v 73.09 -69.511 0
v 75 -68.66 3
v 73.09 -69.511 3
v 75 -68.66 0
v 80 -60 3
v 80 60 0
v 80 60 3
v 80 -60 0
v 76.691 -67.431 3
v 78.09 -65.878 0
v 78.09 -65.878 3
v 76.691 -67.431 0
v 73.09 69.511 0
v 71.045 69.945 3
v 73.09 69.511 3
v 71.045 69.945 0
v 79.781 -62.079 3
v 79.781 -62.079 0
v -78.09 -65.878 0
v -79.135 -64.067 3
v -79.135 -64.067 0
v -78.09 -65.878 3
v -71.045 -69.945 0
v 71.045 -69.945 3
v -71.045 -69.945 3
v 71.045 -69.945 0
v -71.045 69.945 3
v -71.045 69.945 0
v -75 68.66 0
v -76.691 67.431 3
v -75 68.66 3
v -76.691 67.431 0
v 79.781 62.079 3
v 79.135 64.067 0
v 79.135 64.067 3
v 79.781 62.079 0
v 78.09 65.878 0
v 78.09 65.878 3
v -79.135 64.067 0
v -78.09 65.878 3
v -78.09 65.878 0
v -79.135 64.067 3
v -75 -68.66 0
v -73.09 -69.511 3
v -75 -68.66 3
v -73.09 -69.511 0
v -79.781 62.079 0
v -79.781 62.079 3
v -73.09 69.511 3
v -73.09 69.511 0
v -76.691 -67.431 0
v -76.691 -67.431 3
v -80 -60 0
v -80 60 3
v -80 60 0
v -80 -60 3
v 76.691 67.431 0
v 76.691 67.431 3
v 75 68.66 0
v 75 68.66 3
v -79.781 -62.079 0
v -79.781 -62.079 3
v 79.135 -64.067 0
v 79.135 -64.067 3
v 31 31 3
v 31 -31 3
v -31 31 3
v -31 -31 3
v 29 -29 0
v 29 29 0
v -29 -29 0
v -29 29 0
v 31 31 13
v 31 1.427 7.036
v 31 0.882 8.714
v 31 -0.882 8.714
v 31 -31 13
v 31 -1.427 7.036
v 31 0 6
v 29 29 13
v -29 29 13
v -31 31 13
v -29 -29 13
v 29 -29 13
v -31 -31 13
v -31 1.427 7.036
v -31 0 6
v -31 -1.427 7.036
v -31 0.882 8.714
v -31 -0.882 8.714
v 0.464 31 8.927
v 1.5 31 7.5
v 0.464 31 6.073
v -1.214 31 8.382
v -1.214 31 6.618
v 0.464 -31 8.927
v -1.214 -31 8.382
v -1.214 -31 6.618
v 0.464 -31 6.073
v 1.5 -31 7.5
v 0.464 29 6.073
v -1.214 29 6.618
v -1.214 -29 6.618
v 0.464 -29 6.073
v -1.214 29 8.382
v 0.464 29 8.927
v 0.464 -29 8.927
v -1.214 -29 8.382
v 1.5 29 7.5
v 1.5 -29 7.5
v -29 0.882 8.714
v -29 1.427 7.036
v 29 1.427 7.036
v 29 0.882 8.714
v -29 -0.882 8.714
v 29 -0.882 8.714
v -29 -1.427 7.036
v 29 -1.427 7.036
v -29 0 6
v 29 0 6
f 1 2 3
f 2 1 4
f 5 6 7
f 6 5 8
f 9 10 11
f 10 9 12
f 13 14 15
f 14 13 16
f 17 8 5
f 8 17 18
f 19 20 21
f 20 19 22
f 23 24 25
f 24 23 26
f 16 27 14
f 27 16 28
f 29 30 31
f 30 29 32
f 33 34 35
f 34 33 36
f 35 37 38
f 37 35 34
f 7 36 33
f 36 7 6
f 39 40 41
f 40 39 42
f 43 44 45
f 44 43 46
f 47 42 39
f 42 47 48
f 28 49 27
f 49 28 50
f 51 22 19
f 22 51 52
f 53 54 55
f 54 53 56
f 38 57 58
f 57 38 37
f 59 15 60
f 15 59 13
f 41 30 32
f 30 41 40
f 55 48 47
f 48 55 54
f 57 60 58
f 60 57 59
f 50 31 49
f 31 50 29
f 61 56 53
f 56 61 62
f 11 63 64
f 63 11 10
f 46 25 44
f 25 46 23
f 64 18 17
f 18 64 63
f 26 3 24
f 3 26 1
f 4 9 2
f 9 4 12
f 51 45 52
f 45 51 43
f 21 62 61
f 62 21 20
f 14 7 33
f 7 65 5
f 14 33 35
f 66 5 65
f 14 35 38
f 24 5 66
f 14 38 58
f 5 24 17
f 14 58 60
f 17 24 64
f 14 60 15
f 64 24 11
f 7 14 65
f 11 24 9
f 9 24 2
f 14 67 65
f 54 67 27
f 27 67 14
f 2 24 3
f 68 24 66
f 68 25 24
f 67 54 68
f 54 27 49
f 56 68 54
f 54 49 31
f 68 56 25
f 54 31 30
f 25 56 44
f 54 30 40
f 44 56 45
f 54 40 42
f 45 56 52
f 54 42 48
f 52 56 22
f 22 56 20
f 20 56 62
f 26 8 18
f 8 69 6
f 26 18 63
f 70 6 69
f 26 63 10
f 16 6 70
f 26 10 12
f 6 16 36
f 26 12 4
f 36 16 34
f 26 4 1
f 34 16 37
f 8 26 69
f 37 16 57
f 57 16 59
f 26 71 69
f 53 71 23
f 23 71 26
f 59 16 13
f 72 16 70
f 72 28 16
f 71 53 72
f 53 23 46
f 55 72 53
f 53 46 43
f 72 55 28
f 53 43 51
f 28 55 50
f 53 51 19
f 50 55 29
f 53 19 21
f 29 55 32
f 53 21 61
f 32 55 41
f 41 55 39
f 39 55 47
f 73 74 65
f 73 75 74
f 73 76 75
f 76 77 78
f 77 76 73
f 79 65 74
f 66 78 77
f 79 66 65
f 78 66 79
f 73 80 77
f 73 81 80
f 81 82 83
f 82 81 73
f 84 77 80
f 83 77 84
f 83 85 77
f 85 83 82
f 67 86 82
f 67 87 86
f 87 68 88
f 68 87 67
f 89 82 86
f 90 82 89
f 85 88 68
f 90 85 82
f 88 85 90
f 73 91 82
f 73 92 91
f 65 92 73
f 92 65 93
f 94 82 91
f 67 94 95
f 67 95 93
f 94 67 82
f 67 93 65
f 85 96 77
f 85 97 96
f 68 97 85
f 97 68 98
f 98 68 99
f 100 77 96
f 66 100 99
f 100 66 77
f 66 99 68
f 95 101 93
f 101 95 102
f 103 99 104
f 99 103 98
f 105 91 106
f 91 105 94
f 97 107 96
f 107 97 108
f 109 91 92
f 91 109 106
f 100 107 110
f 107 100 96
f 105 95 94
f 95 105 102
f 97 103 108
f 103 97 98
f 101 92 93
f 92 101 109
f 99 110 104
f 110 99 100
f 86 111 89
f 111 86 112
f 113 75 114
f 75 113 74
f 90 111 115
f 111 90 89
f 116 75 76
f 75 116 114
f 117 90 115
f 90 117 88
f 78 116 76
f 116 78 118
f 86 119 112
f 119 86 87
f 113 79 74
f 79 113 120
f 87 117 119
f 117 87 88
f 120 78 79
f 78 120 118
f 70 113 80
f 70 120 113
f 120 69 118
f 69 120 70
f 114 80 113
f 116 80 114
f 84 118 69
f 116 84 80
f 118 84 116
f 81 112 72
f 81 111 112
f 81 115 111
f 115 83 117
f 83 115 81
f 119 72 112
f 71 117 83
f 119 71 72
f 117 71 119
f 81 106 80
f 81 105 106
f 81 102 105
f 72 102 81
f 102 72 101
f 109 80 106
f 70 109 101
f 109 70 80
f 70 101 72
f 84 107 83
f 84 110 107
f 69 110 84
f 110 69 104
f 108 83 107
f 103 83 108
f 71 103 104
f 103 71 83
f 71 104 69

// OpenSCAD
/*

Teddy Robot upper torso

//servo ax12a
// 50x32
// M2 taps
// 

*/


thick=3;
servo_width=32;
servo_length=50;
servo_hole_dist=8;
servo_tap_dia=2.5;
servo_frame=5;
upper_width=servo_length+20;
upper_length=servo_length+20;
upper_height=servo_length+20;
frame_width=10;
bottom_width=servo_length*2+40;
bottom_length=servo_length*2+60;
tap_height=thick+6;
servo2_length=42;


module bolts() {
 translate([0,50,7.5]) rotate([90,0,0]) cylinder(100,3/2,3/2);
 translate([-50,0,7.5]) rotate([0,90,0]) cylinder(100,3/2,3/2);
}

module taps() {
 // servo taps
 union() {
  // tap bottom left
  translate([-8,2.5,-2]) cylinder(tap_height,servo_tap_dia/2,servo_tap_dia/2);
  // tap bottom right
  translate([8,2.5,-2]) cylinder(tap_height,servo_tap_dia/2,servo_tap_dia/2);
  // tap block left
  translate([-16+2.5,8,-2]) cylinder(tap_height,servo_tap_dia/2,servo_tap_dia/2);
  translate([-16+2.5,16,-2]) cylinder(tap_height,servo_tap_dia/2,servo_tap_dia/2);
  translate([-16+2.5,24,-2]) cylinder(tap_height,servo_tap_dia/2,servo_tap_dia/2);
  translate([-16+2.5,32,-2]) cylinder(tap_height,servo_tap_dia/2,servo_tap_dia/2);
  // tap block right
  translate([16-2.5,8,-2]) cylinder(tap_height,servo_tap_dia/2,servo_tap_dia/2);
  translate([16-2.5,16,-2]) cylinder(tap_height,servo_tap_dia/2,servo_tap_dia/2);
  translate([16-2.5,24,-2]) cylinder(tap_height,servo_tap_dia/2,servo_tap_dia/2);
  translate([16-2.5,32,-2]) cylinder(tap_height,servo_tap_dia/2,servo_tap_dia/2);
  // extra holes
  translate([-24,1,-2]) cylinder(tap_height,frame_width/2,frame_width/2);
  translate([24,1,-2]) cylinder(tap_height,frame_width/2,frame_width/2);
  translate([-24,49,-2]) cylinder(tap_height,frame_width/2,frame_width/2);
  translate([24,49,-2]) cylinder(tap_height,frame_width/2,frame_width/2);
 }
}

module top() {
 difference() {
  // upper servo plate
  color ("black") translate([-upper_width/2,-upper_length/2,thick+upper_height]) cube([upper_width,upper_length,thick]);
  // servo diff
  union() {
   color ("lightblue") translate([-(servo_width-servo_frame*2)/2,-(servo_length-servo_frame*2)/2,thick+upper_height-1]) cube([servo_width-servo_frame*2,servo_length-servo_frame*2,thick+2]);
   color ("lightgreen") translate([0,-(servo_length-servo_frame*2)/2-servo_frame,thick+upper_height-1]) taps();
  }
 }
}

// walls
module walls() {
 difference() {
  union() {
   // left
   color ("blue") translate([-upper_width/2,-upper_length/2,thick]) cube([thick,upper_length,upper_height]);
   // right
   color ("yellow") translate([upper_width/2-thick,-upper_length/2,thick]) cube([thick,upper_length,upper_height]);
    // front
   color ("orange") translate([-upper_width/2,-upper_length/2,thick]) cube([upper_width,thick,upper_height]);
   // back
   color ("pink") translate([-upper_width/2,upper_length/2-thick,thick]) cube([upper_width,thick,upper_height]);
  }
  // diff
  union() {
   // deletion cube X
   color ("red") translate([-upper_width,-servo2_length/2,frame_width+thick]) cube([upper_width*2,servo2_length,upper_height-frame_width*2]);
   // deletion cube Y
   color ("green") translate([-servo2_length/2,-upper_length,frame_width+thick]) cube([servo2_length,upper_length*2,upper_height-frame_width*2]);
  // add bolts()
  bolts();
  }
 }
}

module bottom() {
  // bottom plate
  difference() {
   union() {
    translate([-(bottom_length-2*frame_width)/2,-(bottom_width-2*frame_width)/2,0])  
    minkowski() {
     color ("darkgreen")
     cube([bottom_length-2*frame_width,bottom_width-2*frame_width,thick/2]);
     cylinder(r=frame_width,h=thick/2);
    }
    color ("white") translate([-(upper_width-4*thick+2*thick)/2+1,-(upper_length-4*thick+2*thick)/2+1,0]) cube([upper_width-4*thick+2*thick-2,upper_length-4*thick+2*thick-2,10+thick]);
   }
  union() {
   translate([-(upper_width-4*thick)/2,-(upper_length-4*thick)/2,-1]) color ("brown") cube([upper_width-4*thick,upper_length-4*thick,thick+20]);
   bolts();
  }
 }
}



// draw

// print part 1
/*
translate([0,0,upper_height+2*thick]) rotate([180,0,0]) union() {
top();
walls();
}
*/


// print part 2
bottom();
